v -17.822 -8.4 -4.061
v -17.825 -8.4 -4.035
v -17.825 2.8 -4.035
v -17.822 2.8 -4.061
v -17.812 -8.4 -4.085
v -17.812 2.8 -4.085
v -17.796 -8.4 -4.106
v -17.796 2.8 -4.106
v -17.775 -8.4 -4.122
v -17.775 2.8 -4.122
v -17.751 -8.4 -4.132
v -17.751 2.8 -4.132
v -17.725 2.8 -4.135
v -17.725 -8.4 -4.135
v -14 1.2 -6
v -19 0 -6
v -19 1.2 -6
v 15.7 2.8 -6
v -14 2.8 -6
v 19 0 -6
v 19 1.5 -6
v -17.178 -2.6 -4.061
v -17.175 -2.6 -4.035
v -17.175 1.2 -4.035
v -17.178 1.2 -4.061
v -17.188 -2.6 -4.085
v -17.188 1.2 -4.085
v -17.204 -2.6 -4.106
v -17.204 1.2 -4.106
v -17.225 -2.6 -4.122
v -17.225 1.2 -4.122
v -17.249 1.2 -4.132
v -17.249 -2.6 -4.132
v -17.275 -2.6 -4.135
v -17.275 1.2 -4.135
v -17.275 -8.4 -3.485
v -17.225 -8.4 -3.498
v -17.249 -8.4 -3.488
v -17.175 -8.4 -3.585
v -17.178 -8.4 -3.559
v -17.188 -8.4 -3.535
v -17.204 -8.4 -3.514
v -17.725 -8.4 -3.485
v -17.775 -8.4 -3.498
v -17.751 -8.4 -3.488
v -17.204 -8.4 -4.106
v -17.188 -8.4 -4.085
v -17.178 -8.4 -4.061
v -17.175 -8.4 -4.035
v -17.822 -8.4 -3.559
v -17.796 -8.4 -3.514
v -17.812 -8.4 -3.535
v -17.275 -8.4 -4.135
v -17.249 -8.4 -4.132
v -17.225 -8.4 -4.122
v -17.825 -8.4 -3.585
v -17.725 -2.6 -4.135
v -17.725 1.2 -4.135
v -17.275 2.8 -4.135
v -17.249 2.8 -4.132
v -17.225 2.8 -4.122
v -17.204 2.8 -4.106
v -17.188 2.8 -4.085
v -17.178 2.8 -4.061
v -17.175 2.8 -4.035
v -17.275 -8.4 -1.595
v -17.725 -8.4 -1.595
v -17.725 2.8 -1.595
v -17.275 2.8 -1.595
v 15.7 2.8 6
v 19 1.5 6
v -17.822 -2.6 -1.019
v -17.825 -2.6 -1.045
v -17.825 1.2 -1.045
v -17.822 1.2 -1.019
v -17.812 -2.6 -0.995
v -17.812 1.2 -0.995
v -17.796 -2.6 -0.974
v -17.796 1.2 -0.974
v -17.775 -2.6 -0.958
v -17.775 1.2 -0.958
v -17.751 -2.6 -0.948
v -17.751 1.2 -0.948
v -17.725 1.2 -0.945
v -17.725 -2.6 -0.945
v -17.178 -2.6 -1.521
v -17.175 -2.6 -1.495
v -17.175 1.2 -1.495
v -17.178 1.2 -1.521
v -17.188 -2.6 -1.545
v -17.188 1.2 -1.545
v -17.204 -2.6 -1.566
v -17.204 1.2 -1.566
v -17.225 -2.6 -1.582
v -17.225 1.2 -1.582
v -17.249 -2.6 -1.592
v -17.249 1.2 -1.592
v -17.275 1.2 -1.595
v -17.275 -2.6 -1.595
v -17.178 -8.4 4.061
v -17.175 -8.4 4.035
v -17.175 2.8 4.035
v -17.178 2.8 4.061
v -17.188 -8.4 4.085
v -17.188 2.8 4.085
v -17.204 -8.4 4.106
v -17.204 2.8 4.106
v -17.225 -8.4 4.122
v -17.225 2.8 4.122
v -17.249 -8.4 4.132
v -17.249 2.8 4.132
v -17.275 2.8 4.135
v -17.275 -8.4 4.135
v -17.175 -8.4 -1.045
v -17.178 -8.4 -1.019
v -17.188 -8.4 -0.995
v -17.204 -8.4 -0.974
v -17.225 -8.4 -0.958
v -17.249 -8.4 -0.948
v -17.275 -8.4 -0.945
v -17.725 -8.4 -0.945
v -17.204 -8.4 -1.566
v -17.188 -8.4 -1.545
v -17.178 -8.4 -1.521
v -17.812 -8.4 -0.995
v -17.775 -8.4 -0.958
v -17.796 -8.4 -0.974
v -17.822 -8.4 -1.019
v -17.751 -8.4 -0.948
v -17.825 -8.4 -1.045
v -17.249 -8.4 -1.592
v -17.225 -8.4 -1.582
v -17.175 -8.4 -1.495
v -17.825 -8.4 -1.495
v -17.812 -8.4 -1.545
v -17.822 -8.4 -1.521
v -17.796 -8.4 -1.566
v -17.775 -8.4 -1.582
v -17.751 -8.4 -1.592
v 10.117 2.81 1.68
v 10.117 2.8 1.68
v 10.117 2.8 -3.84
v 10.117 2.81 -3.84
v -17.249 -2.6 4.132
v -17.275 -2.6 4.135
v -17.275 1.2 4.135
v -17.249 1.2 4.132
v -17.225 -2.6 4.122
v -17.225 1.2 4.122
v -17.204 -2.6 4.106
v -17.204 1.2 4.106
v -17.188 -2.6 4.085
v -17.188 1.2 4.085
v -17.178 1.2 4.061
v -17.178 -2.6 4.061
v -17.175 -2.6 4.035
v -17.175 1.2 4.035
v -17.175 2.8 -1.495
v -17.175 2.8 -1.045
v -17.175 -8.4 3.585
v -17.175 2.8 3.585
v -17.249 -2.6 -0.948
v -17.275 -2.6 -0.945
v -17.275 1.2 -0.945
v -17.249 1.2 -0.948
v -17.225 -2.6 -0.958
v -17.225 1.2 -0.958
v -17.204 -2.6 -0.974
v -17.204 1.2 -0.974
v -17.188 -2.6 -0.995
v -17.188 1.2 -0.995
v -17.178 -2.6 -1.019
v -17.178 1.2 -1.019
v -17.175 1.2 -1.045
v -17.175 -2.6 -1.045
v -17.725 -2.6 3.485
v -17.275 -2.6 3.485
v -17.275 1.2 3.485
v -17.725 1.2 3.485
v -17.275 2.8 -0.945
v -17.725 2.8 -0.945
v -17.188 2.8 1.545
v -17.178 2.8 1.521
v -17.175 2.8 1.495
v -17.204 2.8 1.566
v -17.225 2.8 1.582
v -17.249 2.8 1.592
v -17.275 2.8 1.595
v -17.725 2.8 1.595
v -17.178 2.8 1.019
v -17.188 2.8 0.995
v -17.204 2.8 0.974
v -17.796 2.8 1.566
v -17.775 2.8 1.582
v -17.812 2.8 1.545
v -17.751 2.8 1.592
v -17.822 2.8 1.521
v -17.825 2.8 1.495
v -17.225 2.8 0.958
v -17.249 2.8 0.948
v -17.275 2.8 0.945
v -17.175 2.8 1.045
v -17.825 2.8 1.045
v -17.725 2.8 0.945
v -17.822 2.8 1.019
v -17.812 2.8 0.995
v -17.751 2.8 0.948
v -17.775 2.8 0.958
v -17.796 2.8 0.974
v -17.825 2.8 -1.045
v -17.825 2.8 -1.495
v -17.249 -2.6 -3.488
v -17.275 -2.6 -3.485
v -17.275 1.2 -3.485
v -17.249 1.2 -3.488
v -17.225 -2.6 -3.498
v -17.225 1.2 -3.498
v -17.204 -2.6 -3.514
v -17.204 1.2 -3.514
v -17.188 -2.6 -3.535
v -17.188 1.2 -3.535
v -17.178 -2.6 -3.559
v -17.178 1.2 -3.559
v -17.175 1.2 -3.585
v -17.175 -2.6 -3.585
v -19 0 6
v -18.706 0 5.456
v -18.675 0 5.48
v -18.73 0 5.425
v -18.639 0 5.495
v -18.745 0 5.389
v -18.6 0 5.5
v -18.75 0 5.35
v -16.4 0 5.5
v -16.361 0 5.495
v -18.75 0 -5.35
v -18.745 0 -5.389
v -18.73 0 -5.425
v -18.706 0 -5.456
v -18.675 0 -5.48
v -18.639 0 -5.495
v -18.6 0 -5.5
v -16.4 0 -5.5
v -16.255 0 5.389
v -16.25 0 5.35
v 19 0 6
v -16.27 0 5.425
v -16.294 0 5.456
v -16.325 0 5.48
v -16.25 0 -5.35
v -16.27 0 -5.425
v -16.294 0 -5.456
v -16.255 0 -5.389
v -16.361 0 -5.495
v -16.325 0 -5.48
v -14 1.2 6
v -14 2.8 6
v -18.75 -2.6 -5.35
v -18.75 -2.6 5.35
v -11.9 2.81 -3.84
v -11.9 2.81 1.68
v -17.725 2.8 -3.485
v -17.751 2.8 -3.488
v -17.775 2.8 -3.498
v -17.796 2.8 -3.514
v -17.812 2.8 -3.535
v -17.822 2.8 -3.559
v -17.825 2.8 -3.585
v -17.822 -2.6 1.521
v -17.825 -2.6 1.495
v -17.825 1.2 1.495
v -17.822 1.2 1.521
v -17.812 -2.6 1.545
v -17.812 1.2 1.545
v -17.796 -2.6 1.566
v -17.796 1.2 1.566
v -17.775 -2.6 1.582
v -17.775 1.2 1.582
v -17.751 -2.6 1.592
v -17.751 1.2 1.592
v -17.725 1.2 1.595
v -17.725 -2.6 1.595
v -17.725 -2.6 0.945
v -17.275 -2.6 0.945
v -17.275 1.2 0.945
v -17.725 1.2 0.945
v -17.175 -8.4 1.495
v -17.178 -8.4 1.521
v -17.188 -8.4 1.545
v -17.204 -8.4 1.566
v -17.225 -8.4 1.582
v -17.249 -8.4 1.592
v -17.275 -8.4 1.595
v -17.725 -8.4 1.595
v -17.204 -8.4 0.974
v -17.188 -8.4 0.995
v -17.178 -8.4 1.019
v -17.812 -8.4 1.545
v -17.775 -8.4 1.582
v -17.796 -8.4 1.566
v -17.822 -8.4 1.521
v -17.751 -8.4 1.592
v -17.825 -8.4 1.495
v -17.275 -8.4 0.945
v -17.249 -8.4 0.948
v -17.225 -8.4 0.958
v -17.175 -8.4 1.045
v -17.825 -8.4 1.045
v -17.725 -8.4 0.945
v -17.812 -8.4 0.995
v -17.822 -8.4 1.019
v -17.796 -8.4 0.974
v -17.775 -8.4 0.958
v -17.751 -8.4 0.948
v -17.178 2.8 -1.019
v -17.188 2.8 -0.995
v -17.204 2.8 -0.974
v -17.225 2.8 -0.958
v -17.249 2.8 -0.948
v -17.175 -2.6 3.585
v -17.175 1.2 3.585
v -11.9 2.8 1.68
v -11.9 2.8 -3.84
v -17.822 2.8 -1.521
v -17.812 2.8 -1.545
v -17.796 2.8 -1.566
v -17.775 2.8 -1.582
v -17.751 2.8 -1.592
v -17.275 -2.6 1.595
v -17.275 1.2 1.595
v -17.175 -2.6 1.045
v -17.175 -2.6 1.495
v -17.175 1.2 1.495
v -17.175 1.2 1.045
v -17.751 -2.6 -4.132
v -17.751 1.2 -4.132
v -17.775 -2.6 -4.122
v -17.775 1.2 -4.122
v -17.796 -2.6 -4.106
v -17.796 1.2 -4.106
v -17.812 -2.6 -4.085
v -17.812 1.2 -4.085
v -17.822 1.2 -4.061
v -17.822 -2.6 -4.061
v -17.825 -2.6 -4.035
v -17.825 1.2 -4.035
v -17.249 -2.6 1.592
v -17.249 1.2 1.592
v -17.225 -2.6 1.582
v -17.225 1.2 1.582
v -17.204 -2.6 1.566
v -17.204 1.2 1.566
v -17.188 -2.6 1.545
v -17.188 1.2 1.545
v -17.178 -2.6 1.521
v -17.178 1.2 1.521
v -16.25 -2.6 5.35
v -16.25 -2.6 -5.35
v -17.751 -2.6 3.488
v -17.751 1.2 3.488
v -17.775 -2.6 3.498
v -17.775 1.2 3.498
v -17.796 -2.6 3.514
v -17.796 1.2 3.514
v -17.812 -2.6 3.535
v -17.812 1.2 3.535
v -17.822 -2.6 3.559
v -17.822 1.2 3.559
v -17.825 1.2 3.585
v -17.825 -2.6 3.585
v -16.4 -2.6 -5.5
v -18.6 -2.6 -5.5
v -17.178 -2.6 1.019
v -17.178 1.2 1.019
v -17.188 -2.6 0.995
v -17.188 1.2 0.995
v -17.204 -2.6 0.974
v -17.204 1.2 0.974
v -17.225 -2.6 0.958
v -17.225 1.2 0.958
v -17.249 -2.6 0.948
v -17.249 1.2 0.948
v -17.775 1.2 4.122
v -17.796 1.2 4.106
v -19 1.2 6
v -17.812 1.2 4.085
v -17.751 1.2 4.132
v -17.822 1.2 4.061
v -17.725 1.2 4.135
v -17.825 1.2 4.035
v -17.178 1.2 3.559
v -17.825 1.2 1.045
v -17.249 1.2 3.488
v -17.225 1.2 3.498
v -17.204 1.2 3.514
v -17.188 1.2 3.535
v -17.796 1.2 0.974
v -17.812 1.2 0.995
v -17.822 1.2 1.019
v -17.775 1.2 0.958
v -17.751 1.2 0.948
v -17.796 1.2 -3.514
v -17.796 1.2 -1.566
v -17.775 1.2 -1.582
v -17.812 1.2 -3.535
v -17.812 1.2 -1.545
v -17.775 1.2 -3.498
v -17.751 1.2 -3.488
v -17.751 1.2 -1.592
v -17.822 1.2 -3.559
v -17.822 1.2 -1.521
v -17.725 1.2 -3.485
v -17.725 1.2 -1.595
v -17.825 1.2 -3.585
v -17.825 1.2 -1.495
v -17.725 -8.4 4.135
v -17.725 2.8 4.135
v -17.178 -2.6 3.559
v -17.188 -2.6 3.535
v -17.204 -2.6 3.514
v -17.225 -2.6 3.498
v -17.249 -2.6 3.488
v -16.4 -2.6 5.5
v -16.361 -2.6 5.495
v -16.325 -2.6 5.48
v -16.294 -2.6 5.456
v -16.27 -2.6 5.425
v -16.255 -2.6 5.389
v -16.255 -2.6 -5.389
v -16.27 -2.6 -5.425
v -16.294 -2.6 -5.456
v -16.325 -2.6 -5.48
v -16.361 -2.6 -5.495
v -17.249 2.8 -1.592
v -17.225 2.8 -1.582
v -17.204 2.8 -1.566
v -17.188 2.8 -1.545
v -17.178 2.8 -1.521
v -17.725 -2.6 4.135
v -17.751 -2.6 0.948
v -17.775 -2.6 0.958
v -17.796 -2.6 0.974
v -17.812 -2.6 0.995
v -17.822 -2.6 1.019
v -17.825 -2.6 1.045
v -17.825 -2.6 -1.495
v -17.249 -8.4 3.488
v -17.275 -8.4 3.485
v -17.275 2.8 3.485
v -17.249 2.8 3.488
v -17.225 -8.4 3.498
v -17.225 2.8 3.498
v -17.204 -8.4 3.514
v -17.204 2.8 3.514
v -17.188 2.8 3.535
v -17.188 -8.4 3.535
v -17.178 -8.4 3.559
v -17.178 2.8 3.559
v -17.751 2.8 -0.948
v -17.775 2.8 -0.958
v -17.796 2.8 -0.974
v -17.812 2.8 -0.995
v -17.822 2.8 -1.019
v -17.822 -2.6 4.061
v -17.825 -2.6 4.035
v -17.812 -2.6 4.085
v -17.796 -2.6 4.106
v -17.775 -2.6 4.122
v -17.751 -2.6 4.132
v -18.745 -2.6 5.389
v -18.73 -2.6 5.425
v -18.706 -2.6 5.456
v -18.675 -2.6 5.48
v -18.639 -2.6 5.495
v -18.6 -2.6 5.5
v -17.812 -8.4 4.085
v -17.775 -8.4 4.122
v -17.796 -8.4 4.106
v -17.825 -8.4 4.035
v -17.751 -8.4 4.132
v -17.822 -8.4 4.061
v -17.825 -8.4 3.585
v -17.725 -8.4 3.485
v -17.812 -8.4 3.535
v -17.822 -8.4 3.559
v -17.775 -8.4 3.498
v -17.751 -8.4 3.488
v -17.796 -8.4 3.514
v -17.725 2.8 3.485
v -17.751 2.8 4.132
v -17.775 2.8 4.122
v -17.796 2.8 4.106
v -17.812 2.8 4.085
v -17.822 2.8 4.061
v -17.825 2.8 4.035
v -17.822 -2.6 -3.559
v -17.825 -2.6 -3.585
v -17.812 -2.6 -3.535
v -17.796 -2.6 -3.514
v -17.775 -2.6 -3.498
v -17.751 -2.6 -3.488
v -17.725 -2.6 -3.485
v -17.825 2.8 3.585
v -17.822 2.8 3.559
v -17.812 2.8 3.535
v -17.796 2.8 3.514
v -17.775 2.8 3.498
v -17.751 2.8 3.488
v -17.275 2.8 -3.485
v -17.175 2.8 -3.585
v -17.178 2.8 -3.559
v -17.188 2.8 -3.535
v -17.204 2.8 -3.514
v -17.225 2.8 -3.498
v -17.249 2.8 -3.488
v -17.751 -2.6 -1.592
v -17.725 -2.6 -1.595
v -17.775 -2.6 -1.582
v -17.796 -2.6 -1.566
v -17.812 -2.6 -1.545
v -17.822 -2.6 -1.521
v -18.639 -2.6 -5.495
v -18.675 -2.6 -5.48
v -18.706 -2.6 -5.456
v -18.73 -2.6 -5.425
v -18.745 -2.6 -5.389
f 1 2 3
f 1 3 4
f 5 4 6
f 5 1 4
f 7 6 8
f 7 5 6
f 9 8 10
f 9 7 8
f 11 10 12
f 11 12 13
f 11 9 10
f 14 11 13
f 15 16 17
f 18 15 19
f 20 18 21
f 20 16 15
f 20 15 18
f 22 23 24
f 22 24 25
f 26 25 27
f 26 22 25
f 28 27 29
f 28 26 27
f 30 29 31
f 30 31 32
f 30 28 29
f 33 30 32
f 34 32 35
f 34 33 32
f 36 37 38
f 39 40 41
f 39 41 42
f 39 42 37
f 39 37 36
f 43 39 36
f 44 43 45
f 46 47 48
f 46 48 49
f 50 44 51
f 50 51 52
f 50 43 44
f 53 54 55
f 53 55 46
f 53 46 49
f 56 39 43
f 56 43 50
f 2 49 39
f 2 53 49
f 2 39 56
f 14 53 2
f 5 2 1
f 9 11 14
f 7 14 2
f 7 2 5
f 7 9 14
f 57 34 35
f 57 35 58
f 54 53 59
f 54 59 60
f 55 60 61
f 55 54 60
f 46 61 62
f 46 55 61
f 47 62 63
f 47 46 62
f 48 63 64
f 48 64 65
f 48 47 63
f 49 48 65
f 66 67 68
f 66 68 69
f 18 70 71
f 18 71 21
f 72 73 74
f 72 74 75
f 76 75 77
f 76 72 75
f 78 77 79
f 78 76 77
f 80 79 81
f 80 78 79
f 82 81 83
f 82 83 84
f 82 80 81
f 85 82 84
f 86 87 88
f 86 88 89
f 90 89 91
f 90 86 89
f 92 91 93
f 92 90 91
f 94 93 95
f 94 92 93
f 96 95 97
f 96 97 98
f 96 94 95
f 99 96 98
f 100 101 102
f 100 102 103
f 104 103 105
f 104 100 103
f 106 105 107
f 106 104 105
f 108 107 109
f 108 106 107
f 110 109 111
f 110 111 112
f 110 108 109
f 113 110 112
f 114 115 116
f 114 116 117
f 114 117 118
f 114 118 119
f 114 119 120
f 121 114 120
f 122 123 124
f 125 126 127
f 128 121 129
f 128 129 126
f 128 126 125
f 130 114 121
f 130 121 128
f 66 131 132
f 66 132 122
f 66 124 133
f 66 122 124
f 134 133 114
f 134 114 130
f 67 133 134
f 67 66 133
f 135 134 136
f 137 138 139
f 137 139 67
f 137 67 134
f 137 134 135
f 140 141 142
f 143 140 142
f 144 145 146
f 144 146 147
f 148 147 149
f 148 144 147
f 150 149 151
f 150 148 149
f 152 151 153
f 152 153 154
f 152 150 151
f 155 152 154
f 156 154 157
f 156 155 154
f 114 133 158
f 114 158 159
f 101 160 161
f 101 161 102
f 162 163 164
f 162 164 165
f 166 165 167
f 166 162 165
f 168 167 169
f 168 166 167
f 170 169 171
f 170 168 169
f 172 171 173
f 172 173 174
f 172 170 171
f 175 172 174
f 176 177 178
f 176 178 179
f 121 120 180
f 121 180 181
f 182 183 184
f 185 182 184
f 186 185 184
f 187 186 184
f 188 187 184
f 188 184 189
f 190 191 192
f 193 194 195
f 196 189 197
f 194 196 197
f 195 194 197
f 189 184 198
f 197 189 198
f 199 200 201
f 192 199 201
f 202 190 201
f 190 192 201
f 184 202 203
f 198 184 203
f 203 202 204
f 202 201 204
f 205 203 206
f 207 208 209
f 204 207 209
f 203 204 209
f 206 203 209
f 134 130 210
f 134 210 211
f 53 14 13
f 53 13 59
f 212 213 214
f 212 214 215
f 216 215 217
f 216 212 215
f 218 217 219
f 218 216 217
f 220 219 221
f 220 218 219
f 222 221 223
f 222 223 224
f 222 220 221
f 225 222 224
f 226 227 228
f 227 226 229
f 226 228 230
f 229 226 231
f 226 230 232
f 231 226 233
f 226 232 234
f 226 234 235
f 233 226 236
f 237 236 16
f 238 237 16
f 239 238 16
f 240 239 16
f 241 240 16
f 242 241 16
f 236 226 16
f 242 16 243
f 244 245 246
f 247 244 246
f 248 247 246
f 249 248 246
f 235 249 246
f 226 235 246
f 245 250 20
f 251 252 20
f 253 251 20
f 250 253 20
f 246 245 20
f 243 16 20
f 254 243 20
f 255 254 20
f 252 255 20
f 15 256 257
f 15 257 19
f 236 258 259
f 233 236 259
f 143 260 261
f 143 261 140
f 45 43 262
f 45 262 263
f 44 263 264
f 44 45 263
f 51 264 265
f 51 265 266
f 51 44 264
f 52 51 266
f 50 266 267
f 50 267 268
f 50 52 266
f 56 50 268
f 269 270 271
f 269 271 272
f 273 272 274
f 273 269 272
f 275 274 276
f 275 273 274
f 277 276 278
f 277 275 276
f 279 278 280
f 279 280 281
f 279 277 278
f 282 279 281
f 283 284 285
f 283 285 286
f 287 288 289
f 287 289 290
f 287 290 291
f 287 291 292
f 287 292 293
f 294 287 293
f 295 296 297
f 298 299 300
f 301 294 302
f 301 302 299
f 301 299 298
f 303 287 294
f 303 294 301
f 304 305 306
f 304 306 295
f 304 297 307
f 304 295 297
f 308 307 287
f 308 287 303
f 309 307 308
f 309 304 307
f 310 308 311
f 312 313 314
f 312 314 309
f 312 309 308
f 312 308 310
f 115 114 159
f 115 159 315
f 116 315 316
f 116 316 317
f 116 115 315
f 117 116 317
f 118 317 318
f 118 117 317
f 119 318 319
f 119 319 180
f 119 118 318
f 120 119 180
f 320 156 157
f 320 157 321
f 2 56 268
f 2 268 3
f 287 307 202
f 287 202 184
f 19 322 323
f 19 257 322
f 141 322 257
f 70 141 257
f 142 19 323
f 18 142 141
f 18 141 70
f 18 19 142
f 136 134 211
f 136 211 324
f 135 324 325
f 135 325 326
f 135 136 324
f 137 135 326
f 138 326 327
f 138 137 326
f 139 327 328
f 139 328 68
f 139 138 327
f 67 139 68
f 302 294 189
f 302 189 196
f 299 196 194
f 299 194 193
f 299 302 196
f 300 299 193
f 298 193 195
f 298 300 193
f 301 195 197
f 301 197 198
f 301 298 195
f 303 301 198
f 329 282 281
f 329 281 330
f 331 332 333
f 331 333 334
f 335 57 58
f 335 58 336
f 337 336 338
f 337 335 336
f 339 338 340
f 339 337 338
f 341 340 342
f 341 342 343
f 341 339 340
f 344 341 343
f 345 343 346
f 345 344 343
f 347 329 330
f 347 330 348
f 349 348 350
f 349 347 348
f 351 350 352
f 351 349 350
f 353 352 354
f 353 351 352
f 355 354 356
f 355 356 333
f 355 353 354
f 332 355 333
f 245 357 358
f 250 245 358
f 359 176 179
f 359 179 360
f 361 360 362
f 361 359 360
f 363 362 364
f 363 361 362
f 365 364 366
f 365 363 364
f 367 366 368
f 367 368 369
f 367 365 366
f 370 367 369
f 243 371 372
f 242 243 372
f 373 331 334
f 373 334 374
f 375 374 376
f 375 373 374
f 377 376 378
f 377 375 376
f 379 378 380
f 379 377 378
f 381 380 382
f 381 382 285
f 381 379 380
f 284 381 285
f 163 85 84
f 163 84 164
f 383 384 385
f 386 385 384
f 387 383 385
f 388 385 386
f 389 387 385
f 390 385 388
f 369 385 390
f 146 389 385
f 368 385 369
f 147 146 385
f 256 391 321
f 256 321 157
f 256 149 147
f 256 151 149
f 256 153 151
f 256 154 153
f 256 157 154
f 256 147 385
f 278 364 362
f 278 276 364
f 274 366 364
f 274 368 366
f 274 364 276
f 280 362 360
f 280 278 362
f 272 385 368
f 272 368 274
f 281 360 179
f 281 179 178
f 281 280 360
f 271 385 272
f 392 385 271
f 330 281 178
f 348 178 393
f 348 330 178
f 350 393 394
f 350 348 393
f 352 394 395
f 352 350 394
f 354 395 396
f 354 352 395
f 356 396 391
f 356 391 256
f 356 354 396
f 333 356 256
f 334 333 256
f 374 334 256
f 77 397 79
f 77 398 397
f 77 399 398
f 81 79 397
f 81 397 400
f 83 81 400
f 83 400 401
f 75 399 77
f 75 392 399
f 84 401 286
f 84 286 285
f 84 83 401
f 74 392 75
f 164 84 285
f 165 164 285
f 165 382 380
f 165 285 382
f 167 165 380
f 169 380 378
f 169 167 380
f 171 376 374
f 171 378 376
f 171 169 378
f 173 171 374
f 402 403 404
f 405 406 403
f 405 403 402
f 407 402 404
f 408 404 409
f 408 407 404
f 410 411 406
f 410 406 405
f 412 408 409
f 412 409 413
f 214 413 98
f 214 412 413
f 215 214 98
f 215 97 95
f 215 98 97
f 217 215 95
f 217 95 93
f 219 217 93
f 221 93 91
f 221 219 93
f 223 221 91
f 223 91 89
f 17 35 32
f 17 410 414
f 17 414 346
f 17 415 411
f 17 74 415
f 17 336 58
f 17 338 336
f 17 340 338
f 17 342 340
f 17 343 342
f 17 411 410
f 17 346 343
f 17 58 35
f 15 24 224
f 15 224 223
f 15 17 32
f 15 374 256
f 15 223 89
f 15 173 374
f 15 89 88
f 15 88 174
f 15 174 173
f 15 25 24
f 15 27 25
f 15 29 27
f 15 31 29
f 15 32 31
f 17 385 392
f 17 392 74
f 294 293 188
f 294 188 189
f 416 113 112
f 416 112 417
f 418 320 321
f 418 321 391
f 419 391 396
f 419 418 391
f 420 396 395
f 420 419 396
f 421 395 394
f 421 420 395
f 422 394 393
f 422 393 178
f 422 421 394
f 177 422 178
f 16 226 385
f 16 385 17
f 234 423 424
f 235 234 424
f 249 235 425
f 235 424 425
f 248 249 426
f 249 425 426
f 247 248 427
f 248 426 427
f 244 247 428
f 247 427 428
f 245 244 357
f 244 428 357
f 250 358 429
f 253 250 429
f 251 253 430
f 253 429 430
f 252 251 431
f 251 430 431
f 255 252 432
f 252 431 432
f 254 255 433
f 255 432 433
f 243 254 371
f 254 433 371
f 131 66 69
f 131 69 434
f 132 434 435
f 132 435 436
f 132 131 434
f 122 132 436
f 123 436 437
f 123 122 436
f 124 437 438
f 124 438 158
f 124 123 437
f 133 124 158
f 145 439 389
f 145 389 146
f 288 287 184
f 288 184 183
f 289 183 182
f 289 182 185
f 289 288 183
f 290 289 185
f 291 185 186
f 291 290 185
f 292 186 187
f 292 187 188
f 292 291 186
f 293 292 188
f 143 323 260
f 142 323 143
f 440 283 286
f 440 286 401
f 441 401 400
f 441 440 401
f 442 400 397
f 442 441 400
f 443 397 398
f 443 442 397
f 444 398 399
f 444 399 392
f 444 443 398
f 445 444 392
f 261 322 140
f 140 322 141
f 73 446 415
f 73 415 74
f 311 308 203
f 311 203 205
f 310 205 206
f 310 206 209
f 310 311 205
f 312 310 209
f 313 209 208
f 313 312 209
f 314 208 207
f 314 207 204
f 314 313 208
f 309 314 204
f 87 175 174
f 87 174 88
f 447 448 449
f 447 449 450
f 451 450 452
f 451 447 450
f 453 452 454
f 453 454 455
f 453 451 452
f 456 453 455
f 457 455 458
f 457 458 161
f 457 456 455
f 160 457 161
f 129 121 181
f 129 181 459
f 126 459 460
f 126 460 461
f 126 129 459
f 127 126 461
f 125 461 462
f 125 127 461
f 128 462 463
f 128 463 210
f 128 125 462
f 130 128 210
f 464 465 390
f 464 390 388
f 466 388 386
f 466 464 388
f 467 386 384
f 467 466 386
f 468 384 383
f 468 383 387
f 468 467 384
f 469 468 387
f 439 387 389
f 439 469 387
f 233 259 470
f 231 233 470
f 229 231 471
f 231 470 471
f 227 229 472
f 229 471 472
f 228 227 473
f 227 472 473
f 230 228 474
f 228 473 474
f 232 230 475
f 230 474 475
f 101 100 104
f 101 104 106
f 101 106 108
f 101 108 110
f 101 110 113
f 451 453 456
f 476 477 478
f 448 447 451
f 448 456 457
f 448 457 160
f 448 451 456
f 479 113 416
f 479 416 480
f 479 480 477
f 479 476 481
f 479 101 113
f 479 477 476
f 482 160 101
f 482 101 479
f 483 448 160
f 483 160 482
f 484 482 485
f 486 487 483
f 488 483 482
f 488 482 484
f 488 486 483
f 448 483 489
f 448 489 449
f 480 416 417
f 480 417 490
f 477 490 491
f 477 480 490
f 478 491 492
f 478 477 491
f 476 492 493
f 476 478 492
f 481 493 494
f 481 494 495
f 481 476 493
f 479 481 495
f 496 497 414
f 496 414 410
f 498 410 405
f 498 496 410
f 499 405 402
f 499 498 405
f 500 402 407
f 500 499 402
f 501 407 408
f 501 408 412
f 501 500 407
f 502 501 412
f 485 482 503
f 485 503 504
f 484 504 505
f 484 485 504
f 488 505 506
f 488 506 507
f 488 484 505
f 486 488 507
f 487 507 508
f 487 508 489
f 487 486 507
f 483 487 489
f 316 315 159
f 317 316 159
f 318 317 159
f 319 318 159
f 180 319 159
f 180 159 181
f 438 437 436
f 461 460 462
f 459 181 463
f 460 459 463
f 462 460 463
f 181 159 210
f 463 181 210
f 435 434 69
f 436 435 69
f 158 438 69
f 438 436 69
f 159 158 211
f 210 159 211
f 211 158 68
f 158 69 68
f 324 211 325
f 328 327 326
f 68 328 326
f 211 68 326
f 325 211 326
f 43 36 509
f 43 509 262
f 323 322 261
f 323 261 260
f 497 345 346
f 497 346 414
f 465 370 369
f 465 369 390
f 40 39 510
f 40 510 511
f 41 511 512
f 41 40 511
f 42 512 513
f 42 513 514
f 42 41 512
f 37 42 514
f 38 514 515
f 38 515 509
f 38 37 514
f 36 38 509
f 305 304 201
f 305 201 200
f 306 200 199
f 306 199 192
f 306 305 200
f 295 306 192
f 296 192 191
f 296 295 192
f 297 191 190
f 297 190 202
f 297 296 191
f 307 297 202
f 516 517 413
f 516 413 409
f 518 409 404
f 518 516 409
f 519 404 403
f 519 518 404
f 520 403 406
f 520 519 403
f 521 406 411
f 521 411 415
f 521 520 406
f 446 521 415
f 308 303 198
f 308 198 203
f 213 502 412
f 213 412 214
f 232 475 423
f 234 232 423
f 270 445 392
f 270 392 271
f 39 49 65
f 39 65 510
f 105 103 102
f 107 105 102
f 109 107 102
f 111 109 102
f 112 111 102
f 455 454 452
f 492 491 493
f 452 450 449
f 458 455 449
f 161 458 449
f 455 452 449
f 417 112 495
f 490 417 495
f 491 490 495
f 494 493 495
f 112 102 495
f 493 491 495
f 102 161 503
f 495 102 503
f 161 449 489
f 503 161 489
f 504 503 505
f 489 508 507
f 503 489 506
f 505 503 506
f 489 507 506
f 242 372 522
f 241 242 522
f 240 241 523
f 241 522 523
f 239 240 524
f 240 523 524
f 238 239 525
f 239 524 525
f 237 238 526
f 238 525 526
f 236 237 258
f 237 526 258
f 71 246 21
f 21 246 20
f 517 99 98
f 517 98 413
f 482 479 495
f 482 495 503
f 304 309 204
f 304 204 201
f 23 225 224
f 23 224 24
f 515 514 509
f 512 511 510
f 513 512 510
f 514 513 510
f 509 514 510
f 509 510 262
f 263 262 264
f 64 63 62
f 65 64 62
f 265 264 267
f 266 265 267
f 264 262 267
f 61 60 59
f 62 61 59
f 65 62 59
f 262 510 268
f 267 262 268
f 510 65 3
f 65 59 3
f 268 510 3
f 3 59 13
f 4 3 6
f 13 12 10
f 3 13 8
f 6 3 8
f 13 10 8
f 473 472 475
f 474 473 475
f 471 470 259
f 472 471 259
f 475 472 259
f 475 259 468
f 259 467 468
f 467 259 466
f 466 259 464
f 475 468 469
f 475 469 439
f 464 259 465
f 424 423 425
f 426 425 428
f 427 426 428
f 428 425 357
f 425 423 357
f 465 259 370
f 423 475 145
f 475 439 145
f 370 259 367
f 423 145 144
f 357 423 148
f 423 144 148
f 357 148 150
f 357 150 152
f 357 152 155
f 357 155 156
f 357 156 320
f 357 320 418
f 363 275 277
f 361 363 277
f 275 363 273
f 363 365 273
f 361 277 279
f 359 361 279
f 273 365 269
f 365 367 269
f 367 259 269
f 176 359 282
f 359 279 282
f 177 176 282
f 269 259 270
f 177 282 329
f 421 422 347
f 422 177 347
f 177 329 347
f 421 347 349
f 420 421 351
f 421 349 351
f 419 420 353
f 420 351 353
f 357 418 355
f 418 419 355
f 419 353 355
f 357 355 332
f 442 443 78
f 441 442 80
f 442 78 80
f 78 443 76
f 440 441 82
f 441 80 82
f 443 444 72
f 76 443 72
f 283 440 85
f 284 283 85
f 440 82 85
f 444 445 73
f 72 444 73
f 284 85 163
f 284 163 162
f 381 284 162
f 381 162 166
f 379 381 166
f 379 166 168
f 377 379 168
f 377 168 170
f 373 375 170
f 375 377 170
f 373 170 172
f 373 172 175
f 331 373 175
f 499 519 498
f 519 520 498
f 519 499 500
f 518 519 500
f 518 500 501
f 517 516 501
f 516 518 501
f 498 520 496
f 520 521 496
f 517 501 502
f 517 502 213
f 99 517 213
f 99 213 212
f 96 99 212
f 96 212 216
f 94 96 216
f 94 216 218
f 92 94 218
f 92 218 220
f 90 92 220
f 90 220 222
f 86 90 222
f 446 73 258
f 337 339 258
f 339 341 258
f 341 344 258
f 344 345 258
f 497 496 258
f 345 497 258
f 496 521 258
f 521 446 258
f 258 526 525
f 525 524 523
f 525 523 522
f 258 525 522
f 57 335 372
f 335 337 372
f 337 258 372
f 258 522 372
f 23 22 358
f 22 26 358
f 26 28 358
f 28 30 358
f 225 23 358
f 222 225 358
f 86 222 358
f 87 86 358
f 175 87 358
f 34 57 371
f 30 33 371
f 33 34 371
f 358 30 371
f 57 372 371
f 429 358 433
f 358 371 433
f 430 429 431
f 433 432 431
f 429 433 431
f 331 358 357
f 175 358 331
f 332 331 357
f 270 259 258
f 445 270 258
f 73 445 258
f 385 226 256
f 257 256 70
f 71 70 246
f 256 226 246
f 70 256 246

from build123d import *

# Parameters (mm, degrees)
SKETCH_507_W           = 33
SKETCH_507_H           = 12
EXTRUDE_1_DEPTH        = 2.8
SKETCH_1_3_W           = 5
SKETCH_1_3_H           = 12
EXTRUDE_2_DEPTH        = 1.2
EXTRUDE_3_DEPTH        = 1.2
EXTRUDE_3_DEPTH_BACK   = 2.6
EXTRUDE_4_DEPTH        = 2.8
EXTRUDE_4_DEPTH_BACK   = 8.4
EXTRUDE_4_2_DEPTH      = 2.8
EXTRUDE_4_2_DEPTH_BACK = 8.4
EXTRUDE_4_3_DEPTH      = 2.8
EXTRUDE_4_3_DEPTH_BACK = 8.4
EXTRUDE_4_4_DEPTH      = 2.8
EXTRUDE_4_4_DEPTH_BACK = 8.4
CHAMFER_2_SIZE         = 1.3
CHAMFER_2_SIZE2        = 3.3
SKETCH_2962_W          = 22.017119527
SKETCH_2962_H          = 5.52
EXTRUDE_5_DEPTH        = 0.01


with BuildPart() as part:
    # Sketch 507 → Бобышка-Вытянуть1 (new body)
    with BuildSketch(Plane(origin=(0, 0, 0), x_dir=(1, 0, 0), z_dir=(0, 1, 0))):
        with Locations((2.5, 0)):
            Rectangle(SKETCH_507_W, SKETCH_507_H)
    extrude(amount=EXTRUDE_1_DEPTH)

    # Эскиз1<3> → Бобышка-Вытянуть2 (add)
    with BuildSketch(Plane(origin=(0, 0, 0), x_dir=(1, 0, 0), z_dir=(0, 1, 0))):
        with Locations((-16.5, 0)):
            Rectangle(SKETCH_1_3_W, SKETCH_1_3_H)
        with BuildLine():
            ThreePointArc((-16.25, -5.35), (-16.293933983, -5.456066017), (-16.4, -5.5))
            Line((-16.4, -5.5), (-18.6, -5.5))
            ThreePointArc((-18.6, -5.5), (-18.706066017, -5.456066017), (-18.75, -5.35))
            Line((-18.75, -5.35), (-18.75, 5.35))
            ThreePointArc((-18.75, 5.35), (-18.706066017, 5.456066017), (-18.6, 5.5))
            Line((-18.6, 5.5), (-16.4, 5.5))
            ThreePointArc((-16.4, 5.5), (-16.293933983, 5.456066017), (-16.25, 5.35))
            Line((-16.25, 5.35), (-16.25, -5.35))
        make_face(mode=Mode.SUBTRACT)
    extrude(amount=EXTRUDE_2_DEPTH)

    # Эскиз1<4> → Бобышка-Вытянуть3 (add, two sides: drawn at the far end of the back side and taken through both)
    with BuildSketch(Plane(origin=(0, 0, 0), x_dir=(1, 0, 0), z_dir=(0, 1, 0)).offset(-EXTRUDE_3_DEPTH_BACK)):
        with BuildLine():
            Line((-18.6, -5.5), (-16.4, -5.5))
            ThreePointArc((-16.4, -5.5), (-16.293933983, -5.456066017), (-16.25, -5.35))
            Line((-16.25, -5.35), (-16.25, 5.35))
            ThreePointArc((-16.25, 5.35), (-16.293933983, 5.456066017), (-16.4, 5.5))
            Line((-16.4, 5.5), (-18.6, 5.5))
            ThreePointArc((-18.6, 5.5), (-18.706066017, 5.456066017), (-18.75, 5.35))
            Line((-18.75, 5.35), (-18.75, -5.35))
            ThreePointArc((-18.75, -5.35), (-18.706066017, -5.456066017), (-18.6, -5.5))
        make_face()
        with BuildLine():
            ThreePointArc((-17.175, -4.035), (-17.204289322, -4.105710678), (-17.275, -4.135))
            Line((-17.275, -4.135), (-17.725, -4.135))
            ThreePointArc((-17.725, -4.135), (-17.795710678, -4.105710678), (-17.825, -4.035))
            Line((-17.825, -4.035), (-17.825, -3.585))
            ThreePointArc((-17.825, -3.585), (-17.795710678, -3.514289322), (-17.725, -3.485))
            Line((-17.725, -3.485), (-17.275, -3.485))
            ThreePointArc((-17.275, -3.485), (-17.204289322, -3.514289322), (-17.175, -3.585))
            Line((-17.175, -3.585), (-17.175, -4.035))
        make_face(mode=Mode.SUBTRACT)
        with BuildLine():
            ThreePointArc((-17.175, -1.495), (-17.204289322, -1.565710678), (-17.275, -1.595))
            Line((-17.275, -1.595), (-17.725, -1.595))
            ThreePointArc((-17.725, -1.595), (-17.795710678, -1.565710678), (-17.825, -1.495))
            Line((-17.825, -1.495), (-17.825, -1.045))
            ThreePointArc((-17.825, -1.045), (-17.795710678, -0.974289322), (-17.725, -0.945))
            Line((-17.725, -0.945), (-17.275, -0.945))
            ThreePointArc((-17.275, -0.945), (-17.204289322, -0.974289322), (-17.175, -1.045))
            Line((-17.175, -1.045), (-17.175, -1.495))
        make_face(mode=Mode.SUBTRACT)
        with BuildLine():
            ThreePointArc((-17.175, 1.045), (-17.204289322, 0.974289322), (-17.275, 0.945))
            Line((-17.275, 0.945), (-17.725, 0.945))
            ThreePointArc((-17.725, 0.945), (-17.795710678, 0.974289322), (-17.825, 1.045))
            Line((-17.825, 1.045), (-17.825, 1.495))
            ThreePointArc((-17.825, 1.495), (-17.795710678, 1.565710678), (-17.725, 1.595))
            Line((-17.725, 1.595), (-17.275, 1.595))
            ThreePointArc((-17.275, 1.595), (-17.204289322, 1.565710678), (-17.175, 1.495))
            Line((-17.175, 1.495), (-17.175, 1.045))
        make_face(mode=Mode.SUBTRACT)
        with BuildLine():
            ThreePointArc((-17.175, 3.585), (-17.204289322, 3.514289322), (-17.275, 3.485))
            Line((-17.275, 3.485), (-17.725, 3.485))
            ThreePointArc((-17.725, 3.485), (-17.795710678, 3.514289322), (-17.825, 3.585))
            Line((-17.825, 3.585), (-17.825, 4.035))
            ThreePointArc((-17.825, 4.035), (-17.795710678, 4.105710678), (-17.725, 4.135))
            Line((-17.725, 4.135), (-17.275, 4.135))
            ThreePointArc((-17.275, 4.135), (-17.204289322, 4.105710678), (-17.175, 4.035))
            Line((-17.175, 4.035), (-17.175, 3.585))
        make_face(mode=Mode.SUBTRACT)
    extrude(amount=EXTRUDE_3_DEPTH + EXTRUDE_3_DEPTH_BACK)

    # Фаска2
    chamfer_2_edges = [part.edges().sort_by_distance(p)[0] for p in [
        (19, 2.8, 0),
    ]]
    chamfer_2_side = [part.faces().sort_by_distance(p)[0] for p in [
        (19, 1.4, 0),
    ]]
    chamfer(chamfer_2_edges, length=CHAMFER_2_SIZE, length2=CHAMFER_2_SIZE2, reference=chamfer_2_side[0])

    # Sketch 2962 → Бобышка-Вытянуть5 (add)
    with BuildSketch(Plane(origin=(0, 2.8, 0), x_dir=(1, 0, 0), z_dir=(0, 1, 0))):
        with Locations((-0.891440237, 1.08)):
            Rectangle(SKETCH_2962_W, SKETCH_2962_H)
    extrude(amount=EXTRUDE_5_DEPTH)


with BuildPart() as body_2:
    # Эскиз1<6> → Бобышка-Вытянуть4 (new, two sides: drawn at the far end of the back side and taken through both)
    with BuildSketch(Plane(origin=(0, 0, 0), x_dir=(1, 0, 0), z_dir=(0, 1, 0)).offset(-EXTRUDE_4_DEPTH_BACK)):
        with BuildLine():
            Line((-17.275, 3.485), (-17.725, 3.485))
            ThreePointArc((-17.725, 3.485), (-17.795710678, 3.514289322), (-17.825, 3.585))
            Line((-17.825, 3.585), (-17.825, 4.035))
            ThreePointArc((-17.825, 4.035), (-17.795710678, 4.105710678), (-17.725, 4.135))
            Line((-17.725, 4.135), (-17.275, 4.135))
            ThreePointArc((-17.275, 4.135), (-17.204289322, 4.105710678), (-17.175, 4.035))
            Line((-17.175, 4.035), (-17.175, 3.585))
            ThreePointArc((-17.175, 3.585), (-17.204289322, 3.514289322), (-17.275, 3.485))
        make_face()
    extrude(amount=EXTRUDE_4_DEPTH + EXTRUDE_4_DEPTH_BACK)


with BuildPart() as body_3:
    # Эскиз1<6> → Extrude 4 2 (new, two sides: drawn at the far end of the back side and taken through both)
    with BuildSketch(Plane(origin=(0, 0, 0), x_dir=(1, 0, 0), z_dir=(0, 1, 0)).offset(-EXTRUDE_4_2_DEPTH_BACK)):
        with BuildLine():
            Line((-17.275, 0.945), (-17.725, 0.945))
            ThreePointArc((-17.725, 0.945), (-17.795710678, 0.974289322), (-17.825, 1.045))
            Line((-17.825, 1.045), (-17.825, 1.495))
            ThreePointArc((-17.825, 1.495), (-17.795710678, 1.565710678), (-17.725, 1.595))
            Line((-17.725, 1.595), (-17.275, 1.595))
            ThreePointArc((-17.275, 1.595), (-17.204289322, 1.565710678), (-17.175, 1.495))
            Line((-17.175, 1.495), (-17.175, 1.045))
            ThreePointArc((-17.175, 1.045), (-17.204289322, 0.974289322), (-17.275, 0.945))
        make_face()
    extrude(amount=EXTRUDE_4_2_DEPTH + EXTRUDE_4_2_DEPTH_BACK)


with BuildPart() as body_4:
    # Эскиз1<6> → Extrude 4 3 (new, two sides: drawn at the far end of the back side and taken through both)
    with BuildSketch(Plane(origin=(0, 0, 0), x_dir=(1, 0, 0), z_dir=(0, 1, 0)).offset(-EXTRUDE_4_3_DEPTH_BACK)):
        with BuildLine():
            Line((-17.275, -1.595), (-17.725, -1.595))
            ThreePointArc((-17.725, -1.595), (-17.795710678, -1.565710678), (-17.825, -1.495))
            Line((-17.825, -1.495), (-17.825, -1.045))
            ThreePointArc((-17.825, -1.045), (-17.795710678, -0.974289322), (-17.725, -0.945))
            Line((-17.725, -0.945), (-17.275, -0.945))
            ThreePointArc((-17.275, -0.945), (-17.204289322, -0.974289322), (-17.175, -1.045))
            Line((-17.175, -1.045), (-17.175, -1.495))
            ThreePointArc((-17.175, -1.495), (-17.204289322, -1.565710678), (-17.275, -1.595))
        make_face()
    extrude(amount=EXTRUDE_4_3_DEPTH + EXTRUDE_4_3_DEPTH_BACK)


with BuildPart() as body_5:
    # Эскиз1<6> → Extrude 4 4 (new, two sides: drawn at the far end of the back side and taken through both)
    with BuildSketch(Plane(origin=(0, 0, 0), x_dir=(1, 0, 0), z_dir=(0, 1, 0)).offset(-EXTRUDE_4_4_DEPTH_BACK)):
        with BuildLine():
            Line((-17.275, -4.135), (-17.725, -4.135))
            ThreePointArc((-17.725, -4.135), (-17.795710678, -4.105710678), (-17.825, -4.035))
            Line((-17.825, -4.035), (-17.825, -3.585))
            ThreePointArc((-17.825, -3.585), (-17.795710678, -3.514289322), (-17.725, -3.485))
            Line((-17.725, -3.485), (-17.275, -3.485))
            ThreePointArc((-17.275, -3.485), (-17.204289322, -3.514289322), (-17.175, -3.585))
            Line((-17.175, -3.585), (-17.175, -4.035))
            ThreePointArc((-17.175, -4.035), (-17.204289322, -4.105710678), (-17.275, -4.135))
        make_face()
    extrude(amount=EXTRUDE_4_4_DEPTH + EXTRUDE_4_4_DEPTH_BACK)


solid = Compound([part.part, body_2.part, body_3.part, body_4.part, body_5.part])
